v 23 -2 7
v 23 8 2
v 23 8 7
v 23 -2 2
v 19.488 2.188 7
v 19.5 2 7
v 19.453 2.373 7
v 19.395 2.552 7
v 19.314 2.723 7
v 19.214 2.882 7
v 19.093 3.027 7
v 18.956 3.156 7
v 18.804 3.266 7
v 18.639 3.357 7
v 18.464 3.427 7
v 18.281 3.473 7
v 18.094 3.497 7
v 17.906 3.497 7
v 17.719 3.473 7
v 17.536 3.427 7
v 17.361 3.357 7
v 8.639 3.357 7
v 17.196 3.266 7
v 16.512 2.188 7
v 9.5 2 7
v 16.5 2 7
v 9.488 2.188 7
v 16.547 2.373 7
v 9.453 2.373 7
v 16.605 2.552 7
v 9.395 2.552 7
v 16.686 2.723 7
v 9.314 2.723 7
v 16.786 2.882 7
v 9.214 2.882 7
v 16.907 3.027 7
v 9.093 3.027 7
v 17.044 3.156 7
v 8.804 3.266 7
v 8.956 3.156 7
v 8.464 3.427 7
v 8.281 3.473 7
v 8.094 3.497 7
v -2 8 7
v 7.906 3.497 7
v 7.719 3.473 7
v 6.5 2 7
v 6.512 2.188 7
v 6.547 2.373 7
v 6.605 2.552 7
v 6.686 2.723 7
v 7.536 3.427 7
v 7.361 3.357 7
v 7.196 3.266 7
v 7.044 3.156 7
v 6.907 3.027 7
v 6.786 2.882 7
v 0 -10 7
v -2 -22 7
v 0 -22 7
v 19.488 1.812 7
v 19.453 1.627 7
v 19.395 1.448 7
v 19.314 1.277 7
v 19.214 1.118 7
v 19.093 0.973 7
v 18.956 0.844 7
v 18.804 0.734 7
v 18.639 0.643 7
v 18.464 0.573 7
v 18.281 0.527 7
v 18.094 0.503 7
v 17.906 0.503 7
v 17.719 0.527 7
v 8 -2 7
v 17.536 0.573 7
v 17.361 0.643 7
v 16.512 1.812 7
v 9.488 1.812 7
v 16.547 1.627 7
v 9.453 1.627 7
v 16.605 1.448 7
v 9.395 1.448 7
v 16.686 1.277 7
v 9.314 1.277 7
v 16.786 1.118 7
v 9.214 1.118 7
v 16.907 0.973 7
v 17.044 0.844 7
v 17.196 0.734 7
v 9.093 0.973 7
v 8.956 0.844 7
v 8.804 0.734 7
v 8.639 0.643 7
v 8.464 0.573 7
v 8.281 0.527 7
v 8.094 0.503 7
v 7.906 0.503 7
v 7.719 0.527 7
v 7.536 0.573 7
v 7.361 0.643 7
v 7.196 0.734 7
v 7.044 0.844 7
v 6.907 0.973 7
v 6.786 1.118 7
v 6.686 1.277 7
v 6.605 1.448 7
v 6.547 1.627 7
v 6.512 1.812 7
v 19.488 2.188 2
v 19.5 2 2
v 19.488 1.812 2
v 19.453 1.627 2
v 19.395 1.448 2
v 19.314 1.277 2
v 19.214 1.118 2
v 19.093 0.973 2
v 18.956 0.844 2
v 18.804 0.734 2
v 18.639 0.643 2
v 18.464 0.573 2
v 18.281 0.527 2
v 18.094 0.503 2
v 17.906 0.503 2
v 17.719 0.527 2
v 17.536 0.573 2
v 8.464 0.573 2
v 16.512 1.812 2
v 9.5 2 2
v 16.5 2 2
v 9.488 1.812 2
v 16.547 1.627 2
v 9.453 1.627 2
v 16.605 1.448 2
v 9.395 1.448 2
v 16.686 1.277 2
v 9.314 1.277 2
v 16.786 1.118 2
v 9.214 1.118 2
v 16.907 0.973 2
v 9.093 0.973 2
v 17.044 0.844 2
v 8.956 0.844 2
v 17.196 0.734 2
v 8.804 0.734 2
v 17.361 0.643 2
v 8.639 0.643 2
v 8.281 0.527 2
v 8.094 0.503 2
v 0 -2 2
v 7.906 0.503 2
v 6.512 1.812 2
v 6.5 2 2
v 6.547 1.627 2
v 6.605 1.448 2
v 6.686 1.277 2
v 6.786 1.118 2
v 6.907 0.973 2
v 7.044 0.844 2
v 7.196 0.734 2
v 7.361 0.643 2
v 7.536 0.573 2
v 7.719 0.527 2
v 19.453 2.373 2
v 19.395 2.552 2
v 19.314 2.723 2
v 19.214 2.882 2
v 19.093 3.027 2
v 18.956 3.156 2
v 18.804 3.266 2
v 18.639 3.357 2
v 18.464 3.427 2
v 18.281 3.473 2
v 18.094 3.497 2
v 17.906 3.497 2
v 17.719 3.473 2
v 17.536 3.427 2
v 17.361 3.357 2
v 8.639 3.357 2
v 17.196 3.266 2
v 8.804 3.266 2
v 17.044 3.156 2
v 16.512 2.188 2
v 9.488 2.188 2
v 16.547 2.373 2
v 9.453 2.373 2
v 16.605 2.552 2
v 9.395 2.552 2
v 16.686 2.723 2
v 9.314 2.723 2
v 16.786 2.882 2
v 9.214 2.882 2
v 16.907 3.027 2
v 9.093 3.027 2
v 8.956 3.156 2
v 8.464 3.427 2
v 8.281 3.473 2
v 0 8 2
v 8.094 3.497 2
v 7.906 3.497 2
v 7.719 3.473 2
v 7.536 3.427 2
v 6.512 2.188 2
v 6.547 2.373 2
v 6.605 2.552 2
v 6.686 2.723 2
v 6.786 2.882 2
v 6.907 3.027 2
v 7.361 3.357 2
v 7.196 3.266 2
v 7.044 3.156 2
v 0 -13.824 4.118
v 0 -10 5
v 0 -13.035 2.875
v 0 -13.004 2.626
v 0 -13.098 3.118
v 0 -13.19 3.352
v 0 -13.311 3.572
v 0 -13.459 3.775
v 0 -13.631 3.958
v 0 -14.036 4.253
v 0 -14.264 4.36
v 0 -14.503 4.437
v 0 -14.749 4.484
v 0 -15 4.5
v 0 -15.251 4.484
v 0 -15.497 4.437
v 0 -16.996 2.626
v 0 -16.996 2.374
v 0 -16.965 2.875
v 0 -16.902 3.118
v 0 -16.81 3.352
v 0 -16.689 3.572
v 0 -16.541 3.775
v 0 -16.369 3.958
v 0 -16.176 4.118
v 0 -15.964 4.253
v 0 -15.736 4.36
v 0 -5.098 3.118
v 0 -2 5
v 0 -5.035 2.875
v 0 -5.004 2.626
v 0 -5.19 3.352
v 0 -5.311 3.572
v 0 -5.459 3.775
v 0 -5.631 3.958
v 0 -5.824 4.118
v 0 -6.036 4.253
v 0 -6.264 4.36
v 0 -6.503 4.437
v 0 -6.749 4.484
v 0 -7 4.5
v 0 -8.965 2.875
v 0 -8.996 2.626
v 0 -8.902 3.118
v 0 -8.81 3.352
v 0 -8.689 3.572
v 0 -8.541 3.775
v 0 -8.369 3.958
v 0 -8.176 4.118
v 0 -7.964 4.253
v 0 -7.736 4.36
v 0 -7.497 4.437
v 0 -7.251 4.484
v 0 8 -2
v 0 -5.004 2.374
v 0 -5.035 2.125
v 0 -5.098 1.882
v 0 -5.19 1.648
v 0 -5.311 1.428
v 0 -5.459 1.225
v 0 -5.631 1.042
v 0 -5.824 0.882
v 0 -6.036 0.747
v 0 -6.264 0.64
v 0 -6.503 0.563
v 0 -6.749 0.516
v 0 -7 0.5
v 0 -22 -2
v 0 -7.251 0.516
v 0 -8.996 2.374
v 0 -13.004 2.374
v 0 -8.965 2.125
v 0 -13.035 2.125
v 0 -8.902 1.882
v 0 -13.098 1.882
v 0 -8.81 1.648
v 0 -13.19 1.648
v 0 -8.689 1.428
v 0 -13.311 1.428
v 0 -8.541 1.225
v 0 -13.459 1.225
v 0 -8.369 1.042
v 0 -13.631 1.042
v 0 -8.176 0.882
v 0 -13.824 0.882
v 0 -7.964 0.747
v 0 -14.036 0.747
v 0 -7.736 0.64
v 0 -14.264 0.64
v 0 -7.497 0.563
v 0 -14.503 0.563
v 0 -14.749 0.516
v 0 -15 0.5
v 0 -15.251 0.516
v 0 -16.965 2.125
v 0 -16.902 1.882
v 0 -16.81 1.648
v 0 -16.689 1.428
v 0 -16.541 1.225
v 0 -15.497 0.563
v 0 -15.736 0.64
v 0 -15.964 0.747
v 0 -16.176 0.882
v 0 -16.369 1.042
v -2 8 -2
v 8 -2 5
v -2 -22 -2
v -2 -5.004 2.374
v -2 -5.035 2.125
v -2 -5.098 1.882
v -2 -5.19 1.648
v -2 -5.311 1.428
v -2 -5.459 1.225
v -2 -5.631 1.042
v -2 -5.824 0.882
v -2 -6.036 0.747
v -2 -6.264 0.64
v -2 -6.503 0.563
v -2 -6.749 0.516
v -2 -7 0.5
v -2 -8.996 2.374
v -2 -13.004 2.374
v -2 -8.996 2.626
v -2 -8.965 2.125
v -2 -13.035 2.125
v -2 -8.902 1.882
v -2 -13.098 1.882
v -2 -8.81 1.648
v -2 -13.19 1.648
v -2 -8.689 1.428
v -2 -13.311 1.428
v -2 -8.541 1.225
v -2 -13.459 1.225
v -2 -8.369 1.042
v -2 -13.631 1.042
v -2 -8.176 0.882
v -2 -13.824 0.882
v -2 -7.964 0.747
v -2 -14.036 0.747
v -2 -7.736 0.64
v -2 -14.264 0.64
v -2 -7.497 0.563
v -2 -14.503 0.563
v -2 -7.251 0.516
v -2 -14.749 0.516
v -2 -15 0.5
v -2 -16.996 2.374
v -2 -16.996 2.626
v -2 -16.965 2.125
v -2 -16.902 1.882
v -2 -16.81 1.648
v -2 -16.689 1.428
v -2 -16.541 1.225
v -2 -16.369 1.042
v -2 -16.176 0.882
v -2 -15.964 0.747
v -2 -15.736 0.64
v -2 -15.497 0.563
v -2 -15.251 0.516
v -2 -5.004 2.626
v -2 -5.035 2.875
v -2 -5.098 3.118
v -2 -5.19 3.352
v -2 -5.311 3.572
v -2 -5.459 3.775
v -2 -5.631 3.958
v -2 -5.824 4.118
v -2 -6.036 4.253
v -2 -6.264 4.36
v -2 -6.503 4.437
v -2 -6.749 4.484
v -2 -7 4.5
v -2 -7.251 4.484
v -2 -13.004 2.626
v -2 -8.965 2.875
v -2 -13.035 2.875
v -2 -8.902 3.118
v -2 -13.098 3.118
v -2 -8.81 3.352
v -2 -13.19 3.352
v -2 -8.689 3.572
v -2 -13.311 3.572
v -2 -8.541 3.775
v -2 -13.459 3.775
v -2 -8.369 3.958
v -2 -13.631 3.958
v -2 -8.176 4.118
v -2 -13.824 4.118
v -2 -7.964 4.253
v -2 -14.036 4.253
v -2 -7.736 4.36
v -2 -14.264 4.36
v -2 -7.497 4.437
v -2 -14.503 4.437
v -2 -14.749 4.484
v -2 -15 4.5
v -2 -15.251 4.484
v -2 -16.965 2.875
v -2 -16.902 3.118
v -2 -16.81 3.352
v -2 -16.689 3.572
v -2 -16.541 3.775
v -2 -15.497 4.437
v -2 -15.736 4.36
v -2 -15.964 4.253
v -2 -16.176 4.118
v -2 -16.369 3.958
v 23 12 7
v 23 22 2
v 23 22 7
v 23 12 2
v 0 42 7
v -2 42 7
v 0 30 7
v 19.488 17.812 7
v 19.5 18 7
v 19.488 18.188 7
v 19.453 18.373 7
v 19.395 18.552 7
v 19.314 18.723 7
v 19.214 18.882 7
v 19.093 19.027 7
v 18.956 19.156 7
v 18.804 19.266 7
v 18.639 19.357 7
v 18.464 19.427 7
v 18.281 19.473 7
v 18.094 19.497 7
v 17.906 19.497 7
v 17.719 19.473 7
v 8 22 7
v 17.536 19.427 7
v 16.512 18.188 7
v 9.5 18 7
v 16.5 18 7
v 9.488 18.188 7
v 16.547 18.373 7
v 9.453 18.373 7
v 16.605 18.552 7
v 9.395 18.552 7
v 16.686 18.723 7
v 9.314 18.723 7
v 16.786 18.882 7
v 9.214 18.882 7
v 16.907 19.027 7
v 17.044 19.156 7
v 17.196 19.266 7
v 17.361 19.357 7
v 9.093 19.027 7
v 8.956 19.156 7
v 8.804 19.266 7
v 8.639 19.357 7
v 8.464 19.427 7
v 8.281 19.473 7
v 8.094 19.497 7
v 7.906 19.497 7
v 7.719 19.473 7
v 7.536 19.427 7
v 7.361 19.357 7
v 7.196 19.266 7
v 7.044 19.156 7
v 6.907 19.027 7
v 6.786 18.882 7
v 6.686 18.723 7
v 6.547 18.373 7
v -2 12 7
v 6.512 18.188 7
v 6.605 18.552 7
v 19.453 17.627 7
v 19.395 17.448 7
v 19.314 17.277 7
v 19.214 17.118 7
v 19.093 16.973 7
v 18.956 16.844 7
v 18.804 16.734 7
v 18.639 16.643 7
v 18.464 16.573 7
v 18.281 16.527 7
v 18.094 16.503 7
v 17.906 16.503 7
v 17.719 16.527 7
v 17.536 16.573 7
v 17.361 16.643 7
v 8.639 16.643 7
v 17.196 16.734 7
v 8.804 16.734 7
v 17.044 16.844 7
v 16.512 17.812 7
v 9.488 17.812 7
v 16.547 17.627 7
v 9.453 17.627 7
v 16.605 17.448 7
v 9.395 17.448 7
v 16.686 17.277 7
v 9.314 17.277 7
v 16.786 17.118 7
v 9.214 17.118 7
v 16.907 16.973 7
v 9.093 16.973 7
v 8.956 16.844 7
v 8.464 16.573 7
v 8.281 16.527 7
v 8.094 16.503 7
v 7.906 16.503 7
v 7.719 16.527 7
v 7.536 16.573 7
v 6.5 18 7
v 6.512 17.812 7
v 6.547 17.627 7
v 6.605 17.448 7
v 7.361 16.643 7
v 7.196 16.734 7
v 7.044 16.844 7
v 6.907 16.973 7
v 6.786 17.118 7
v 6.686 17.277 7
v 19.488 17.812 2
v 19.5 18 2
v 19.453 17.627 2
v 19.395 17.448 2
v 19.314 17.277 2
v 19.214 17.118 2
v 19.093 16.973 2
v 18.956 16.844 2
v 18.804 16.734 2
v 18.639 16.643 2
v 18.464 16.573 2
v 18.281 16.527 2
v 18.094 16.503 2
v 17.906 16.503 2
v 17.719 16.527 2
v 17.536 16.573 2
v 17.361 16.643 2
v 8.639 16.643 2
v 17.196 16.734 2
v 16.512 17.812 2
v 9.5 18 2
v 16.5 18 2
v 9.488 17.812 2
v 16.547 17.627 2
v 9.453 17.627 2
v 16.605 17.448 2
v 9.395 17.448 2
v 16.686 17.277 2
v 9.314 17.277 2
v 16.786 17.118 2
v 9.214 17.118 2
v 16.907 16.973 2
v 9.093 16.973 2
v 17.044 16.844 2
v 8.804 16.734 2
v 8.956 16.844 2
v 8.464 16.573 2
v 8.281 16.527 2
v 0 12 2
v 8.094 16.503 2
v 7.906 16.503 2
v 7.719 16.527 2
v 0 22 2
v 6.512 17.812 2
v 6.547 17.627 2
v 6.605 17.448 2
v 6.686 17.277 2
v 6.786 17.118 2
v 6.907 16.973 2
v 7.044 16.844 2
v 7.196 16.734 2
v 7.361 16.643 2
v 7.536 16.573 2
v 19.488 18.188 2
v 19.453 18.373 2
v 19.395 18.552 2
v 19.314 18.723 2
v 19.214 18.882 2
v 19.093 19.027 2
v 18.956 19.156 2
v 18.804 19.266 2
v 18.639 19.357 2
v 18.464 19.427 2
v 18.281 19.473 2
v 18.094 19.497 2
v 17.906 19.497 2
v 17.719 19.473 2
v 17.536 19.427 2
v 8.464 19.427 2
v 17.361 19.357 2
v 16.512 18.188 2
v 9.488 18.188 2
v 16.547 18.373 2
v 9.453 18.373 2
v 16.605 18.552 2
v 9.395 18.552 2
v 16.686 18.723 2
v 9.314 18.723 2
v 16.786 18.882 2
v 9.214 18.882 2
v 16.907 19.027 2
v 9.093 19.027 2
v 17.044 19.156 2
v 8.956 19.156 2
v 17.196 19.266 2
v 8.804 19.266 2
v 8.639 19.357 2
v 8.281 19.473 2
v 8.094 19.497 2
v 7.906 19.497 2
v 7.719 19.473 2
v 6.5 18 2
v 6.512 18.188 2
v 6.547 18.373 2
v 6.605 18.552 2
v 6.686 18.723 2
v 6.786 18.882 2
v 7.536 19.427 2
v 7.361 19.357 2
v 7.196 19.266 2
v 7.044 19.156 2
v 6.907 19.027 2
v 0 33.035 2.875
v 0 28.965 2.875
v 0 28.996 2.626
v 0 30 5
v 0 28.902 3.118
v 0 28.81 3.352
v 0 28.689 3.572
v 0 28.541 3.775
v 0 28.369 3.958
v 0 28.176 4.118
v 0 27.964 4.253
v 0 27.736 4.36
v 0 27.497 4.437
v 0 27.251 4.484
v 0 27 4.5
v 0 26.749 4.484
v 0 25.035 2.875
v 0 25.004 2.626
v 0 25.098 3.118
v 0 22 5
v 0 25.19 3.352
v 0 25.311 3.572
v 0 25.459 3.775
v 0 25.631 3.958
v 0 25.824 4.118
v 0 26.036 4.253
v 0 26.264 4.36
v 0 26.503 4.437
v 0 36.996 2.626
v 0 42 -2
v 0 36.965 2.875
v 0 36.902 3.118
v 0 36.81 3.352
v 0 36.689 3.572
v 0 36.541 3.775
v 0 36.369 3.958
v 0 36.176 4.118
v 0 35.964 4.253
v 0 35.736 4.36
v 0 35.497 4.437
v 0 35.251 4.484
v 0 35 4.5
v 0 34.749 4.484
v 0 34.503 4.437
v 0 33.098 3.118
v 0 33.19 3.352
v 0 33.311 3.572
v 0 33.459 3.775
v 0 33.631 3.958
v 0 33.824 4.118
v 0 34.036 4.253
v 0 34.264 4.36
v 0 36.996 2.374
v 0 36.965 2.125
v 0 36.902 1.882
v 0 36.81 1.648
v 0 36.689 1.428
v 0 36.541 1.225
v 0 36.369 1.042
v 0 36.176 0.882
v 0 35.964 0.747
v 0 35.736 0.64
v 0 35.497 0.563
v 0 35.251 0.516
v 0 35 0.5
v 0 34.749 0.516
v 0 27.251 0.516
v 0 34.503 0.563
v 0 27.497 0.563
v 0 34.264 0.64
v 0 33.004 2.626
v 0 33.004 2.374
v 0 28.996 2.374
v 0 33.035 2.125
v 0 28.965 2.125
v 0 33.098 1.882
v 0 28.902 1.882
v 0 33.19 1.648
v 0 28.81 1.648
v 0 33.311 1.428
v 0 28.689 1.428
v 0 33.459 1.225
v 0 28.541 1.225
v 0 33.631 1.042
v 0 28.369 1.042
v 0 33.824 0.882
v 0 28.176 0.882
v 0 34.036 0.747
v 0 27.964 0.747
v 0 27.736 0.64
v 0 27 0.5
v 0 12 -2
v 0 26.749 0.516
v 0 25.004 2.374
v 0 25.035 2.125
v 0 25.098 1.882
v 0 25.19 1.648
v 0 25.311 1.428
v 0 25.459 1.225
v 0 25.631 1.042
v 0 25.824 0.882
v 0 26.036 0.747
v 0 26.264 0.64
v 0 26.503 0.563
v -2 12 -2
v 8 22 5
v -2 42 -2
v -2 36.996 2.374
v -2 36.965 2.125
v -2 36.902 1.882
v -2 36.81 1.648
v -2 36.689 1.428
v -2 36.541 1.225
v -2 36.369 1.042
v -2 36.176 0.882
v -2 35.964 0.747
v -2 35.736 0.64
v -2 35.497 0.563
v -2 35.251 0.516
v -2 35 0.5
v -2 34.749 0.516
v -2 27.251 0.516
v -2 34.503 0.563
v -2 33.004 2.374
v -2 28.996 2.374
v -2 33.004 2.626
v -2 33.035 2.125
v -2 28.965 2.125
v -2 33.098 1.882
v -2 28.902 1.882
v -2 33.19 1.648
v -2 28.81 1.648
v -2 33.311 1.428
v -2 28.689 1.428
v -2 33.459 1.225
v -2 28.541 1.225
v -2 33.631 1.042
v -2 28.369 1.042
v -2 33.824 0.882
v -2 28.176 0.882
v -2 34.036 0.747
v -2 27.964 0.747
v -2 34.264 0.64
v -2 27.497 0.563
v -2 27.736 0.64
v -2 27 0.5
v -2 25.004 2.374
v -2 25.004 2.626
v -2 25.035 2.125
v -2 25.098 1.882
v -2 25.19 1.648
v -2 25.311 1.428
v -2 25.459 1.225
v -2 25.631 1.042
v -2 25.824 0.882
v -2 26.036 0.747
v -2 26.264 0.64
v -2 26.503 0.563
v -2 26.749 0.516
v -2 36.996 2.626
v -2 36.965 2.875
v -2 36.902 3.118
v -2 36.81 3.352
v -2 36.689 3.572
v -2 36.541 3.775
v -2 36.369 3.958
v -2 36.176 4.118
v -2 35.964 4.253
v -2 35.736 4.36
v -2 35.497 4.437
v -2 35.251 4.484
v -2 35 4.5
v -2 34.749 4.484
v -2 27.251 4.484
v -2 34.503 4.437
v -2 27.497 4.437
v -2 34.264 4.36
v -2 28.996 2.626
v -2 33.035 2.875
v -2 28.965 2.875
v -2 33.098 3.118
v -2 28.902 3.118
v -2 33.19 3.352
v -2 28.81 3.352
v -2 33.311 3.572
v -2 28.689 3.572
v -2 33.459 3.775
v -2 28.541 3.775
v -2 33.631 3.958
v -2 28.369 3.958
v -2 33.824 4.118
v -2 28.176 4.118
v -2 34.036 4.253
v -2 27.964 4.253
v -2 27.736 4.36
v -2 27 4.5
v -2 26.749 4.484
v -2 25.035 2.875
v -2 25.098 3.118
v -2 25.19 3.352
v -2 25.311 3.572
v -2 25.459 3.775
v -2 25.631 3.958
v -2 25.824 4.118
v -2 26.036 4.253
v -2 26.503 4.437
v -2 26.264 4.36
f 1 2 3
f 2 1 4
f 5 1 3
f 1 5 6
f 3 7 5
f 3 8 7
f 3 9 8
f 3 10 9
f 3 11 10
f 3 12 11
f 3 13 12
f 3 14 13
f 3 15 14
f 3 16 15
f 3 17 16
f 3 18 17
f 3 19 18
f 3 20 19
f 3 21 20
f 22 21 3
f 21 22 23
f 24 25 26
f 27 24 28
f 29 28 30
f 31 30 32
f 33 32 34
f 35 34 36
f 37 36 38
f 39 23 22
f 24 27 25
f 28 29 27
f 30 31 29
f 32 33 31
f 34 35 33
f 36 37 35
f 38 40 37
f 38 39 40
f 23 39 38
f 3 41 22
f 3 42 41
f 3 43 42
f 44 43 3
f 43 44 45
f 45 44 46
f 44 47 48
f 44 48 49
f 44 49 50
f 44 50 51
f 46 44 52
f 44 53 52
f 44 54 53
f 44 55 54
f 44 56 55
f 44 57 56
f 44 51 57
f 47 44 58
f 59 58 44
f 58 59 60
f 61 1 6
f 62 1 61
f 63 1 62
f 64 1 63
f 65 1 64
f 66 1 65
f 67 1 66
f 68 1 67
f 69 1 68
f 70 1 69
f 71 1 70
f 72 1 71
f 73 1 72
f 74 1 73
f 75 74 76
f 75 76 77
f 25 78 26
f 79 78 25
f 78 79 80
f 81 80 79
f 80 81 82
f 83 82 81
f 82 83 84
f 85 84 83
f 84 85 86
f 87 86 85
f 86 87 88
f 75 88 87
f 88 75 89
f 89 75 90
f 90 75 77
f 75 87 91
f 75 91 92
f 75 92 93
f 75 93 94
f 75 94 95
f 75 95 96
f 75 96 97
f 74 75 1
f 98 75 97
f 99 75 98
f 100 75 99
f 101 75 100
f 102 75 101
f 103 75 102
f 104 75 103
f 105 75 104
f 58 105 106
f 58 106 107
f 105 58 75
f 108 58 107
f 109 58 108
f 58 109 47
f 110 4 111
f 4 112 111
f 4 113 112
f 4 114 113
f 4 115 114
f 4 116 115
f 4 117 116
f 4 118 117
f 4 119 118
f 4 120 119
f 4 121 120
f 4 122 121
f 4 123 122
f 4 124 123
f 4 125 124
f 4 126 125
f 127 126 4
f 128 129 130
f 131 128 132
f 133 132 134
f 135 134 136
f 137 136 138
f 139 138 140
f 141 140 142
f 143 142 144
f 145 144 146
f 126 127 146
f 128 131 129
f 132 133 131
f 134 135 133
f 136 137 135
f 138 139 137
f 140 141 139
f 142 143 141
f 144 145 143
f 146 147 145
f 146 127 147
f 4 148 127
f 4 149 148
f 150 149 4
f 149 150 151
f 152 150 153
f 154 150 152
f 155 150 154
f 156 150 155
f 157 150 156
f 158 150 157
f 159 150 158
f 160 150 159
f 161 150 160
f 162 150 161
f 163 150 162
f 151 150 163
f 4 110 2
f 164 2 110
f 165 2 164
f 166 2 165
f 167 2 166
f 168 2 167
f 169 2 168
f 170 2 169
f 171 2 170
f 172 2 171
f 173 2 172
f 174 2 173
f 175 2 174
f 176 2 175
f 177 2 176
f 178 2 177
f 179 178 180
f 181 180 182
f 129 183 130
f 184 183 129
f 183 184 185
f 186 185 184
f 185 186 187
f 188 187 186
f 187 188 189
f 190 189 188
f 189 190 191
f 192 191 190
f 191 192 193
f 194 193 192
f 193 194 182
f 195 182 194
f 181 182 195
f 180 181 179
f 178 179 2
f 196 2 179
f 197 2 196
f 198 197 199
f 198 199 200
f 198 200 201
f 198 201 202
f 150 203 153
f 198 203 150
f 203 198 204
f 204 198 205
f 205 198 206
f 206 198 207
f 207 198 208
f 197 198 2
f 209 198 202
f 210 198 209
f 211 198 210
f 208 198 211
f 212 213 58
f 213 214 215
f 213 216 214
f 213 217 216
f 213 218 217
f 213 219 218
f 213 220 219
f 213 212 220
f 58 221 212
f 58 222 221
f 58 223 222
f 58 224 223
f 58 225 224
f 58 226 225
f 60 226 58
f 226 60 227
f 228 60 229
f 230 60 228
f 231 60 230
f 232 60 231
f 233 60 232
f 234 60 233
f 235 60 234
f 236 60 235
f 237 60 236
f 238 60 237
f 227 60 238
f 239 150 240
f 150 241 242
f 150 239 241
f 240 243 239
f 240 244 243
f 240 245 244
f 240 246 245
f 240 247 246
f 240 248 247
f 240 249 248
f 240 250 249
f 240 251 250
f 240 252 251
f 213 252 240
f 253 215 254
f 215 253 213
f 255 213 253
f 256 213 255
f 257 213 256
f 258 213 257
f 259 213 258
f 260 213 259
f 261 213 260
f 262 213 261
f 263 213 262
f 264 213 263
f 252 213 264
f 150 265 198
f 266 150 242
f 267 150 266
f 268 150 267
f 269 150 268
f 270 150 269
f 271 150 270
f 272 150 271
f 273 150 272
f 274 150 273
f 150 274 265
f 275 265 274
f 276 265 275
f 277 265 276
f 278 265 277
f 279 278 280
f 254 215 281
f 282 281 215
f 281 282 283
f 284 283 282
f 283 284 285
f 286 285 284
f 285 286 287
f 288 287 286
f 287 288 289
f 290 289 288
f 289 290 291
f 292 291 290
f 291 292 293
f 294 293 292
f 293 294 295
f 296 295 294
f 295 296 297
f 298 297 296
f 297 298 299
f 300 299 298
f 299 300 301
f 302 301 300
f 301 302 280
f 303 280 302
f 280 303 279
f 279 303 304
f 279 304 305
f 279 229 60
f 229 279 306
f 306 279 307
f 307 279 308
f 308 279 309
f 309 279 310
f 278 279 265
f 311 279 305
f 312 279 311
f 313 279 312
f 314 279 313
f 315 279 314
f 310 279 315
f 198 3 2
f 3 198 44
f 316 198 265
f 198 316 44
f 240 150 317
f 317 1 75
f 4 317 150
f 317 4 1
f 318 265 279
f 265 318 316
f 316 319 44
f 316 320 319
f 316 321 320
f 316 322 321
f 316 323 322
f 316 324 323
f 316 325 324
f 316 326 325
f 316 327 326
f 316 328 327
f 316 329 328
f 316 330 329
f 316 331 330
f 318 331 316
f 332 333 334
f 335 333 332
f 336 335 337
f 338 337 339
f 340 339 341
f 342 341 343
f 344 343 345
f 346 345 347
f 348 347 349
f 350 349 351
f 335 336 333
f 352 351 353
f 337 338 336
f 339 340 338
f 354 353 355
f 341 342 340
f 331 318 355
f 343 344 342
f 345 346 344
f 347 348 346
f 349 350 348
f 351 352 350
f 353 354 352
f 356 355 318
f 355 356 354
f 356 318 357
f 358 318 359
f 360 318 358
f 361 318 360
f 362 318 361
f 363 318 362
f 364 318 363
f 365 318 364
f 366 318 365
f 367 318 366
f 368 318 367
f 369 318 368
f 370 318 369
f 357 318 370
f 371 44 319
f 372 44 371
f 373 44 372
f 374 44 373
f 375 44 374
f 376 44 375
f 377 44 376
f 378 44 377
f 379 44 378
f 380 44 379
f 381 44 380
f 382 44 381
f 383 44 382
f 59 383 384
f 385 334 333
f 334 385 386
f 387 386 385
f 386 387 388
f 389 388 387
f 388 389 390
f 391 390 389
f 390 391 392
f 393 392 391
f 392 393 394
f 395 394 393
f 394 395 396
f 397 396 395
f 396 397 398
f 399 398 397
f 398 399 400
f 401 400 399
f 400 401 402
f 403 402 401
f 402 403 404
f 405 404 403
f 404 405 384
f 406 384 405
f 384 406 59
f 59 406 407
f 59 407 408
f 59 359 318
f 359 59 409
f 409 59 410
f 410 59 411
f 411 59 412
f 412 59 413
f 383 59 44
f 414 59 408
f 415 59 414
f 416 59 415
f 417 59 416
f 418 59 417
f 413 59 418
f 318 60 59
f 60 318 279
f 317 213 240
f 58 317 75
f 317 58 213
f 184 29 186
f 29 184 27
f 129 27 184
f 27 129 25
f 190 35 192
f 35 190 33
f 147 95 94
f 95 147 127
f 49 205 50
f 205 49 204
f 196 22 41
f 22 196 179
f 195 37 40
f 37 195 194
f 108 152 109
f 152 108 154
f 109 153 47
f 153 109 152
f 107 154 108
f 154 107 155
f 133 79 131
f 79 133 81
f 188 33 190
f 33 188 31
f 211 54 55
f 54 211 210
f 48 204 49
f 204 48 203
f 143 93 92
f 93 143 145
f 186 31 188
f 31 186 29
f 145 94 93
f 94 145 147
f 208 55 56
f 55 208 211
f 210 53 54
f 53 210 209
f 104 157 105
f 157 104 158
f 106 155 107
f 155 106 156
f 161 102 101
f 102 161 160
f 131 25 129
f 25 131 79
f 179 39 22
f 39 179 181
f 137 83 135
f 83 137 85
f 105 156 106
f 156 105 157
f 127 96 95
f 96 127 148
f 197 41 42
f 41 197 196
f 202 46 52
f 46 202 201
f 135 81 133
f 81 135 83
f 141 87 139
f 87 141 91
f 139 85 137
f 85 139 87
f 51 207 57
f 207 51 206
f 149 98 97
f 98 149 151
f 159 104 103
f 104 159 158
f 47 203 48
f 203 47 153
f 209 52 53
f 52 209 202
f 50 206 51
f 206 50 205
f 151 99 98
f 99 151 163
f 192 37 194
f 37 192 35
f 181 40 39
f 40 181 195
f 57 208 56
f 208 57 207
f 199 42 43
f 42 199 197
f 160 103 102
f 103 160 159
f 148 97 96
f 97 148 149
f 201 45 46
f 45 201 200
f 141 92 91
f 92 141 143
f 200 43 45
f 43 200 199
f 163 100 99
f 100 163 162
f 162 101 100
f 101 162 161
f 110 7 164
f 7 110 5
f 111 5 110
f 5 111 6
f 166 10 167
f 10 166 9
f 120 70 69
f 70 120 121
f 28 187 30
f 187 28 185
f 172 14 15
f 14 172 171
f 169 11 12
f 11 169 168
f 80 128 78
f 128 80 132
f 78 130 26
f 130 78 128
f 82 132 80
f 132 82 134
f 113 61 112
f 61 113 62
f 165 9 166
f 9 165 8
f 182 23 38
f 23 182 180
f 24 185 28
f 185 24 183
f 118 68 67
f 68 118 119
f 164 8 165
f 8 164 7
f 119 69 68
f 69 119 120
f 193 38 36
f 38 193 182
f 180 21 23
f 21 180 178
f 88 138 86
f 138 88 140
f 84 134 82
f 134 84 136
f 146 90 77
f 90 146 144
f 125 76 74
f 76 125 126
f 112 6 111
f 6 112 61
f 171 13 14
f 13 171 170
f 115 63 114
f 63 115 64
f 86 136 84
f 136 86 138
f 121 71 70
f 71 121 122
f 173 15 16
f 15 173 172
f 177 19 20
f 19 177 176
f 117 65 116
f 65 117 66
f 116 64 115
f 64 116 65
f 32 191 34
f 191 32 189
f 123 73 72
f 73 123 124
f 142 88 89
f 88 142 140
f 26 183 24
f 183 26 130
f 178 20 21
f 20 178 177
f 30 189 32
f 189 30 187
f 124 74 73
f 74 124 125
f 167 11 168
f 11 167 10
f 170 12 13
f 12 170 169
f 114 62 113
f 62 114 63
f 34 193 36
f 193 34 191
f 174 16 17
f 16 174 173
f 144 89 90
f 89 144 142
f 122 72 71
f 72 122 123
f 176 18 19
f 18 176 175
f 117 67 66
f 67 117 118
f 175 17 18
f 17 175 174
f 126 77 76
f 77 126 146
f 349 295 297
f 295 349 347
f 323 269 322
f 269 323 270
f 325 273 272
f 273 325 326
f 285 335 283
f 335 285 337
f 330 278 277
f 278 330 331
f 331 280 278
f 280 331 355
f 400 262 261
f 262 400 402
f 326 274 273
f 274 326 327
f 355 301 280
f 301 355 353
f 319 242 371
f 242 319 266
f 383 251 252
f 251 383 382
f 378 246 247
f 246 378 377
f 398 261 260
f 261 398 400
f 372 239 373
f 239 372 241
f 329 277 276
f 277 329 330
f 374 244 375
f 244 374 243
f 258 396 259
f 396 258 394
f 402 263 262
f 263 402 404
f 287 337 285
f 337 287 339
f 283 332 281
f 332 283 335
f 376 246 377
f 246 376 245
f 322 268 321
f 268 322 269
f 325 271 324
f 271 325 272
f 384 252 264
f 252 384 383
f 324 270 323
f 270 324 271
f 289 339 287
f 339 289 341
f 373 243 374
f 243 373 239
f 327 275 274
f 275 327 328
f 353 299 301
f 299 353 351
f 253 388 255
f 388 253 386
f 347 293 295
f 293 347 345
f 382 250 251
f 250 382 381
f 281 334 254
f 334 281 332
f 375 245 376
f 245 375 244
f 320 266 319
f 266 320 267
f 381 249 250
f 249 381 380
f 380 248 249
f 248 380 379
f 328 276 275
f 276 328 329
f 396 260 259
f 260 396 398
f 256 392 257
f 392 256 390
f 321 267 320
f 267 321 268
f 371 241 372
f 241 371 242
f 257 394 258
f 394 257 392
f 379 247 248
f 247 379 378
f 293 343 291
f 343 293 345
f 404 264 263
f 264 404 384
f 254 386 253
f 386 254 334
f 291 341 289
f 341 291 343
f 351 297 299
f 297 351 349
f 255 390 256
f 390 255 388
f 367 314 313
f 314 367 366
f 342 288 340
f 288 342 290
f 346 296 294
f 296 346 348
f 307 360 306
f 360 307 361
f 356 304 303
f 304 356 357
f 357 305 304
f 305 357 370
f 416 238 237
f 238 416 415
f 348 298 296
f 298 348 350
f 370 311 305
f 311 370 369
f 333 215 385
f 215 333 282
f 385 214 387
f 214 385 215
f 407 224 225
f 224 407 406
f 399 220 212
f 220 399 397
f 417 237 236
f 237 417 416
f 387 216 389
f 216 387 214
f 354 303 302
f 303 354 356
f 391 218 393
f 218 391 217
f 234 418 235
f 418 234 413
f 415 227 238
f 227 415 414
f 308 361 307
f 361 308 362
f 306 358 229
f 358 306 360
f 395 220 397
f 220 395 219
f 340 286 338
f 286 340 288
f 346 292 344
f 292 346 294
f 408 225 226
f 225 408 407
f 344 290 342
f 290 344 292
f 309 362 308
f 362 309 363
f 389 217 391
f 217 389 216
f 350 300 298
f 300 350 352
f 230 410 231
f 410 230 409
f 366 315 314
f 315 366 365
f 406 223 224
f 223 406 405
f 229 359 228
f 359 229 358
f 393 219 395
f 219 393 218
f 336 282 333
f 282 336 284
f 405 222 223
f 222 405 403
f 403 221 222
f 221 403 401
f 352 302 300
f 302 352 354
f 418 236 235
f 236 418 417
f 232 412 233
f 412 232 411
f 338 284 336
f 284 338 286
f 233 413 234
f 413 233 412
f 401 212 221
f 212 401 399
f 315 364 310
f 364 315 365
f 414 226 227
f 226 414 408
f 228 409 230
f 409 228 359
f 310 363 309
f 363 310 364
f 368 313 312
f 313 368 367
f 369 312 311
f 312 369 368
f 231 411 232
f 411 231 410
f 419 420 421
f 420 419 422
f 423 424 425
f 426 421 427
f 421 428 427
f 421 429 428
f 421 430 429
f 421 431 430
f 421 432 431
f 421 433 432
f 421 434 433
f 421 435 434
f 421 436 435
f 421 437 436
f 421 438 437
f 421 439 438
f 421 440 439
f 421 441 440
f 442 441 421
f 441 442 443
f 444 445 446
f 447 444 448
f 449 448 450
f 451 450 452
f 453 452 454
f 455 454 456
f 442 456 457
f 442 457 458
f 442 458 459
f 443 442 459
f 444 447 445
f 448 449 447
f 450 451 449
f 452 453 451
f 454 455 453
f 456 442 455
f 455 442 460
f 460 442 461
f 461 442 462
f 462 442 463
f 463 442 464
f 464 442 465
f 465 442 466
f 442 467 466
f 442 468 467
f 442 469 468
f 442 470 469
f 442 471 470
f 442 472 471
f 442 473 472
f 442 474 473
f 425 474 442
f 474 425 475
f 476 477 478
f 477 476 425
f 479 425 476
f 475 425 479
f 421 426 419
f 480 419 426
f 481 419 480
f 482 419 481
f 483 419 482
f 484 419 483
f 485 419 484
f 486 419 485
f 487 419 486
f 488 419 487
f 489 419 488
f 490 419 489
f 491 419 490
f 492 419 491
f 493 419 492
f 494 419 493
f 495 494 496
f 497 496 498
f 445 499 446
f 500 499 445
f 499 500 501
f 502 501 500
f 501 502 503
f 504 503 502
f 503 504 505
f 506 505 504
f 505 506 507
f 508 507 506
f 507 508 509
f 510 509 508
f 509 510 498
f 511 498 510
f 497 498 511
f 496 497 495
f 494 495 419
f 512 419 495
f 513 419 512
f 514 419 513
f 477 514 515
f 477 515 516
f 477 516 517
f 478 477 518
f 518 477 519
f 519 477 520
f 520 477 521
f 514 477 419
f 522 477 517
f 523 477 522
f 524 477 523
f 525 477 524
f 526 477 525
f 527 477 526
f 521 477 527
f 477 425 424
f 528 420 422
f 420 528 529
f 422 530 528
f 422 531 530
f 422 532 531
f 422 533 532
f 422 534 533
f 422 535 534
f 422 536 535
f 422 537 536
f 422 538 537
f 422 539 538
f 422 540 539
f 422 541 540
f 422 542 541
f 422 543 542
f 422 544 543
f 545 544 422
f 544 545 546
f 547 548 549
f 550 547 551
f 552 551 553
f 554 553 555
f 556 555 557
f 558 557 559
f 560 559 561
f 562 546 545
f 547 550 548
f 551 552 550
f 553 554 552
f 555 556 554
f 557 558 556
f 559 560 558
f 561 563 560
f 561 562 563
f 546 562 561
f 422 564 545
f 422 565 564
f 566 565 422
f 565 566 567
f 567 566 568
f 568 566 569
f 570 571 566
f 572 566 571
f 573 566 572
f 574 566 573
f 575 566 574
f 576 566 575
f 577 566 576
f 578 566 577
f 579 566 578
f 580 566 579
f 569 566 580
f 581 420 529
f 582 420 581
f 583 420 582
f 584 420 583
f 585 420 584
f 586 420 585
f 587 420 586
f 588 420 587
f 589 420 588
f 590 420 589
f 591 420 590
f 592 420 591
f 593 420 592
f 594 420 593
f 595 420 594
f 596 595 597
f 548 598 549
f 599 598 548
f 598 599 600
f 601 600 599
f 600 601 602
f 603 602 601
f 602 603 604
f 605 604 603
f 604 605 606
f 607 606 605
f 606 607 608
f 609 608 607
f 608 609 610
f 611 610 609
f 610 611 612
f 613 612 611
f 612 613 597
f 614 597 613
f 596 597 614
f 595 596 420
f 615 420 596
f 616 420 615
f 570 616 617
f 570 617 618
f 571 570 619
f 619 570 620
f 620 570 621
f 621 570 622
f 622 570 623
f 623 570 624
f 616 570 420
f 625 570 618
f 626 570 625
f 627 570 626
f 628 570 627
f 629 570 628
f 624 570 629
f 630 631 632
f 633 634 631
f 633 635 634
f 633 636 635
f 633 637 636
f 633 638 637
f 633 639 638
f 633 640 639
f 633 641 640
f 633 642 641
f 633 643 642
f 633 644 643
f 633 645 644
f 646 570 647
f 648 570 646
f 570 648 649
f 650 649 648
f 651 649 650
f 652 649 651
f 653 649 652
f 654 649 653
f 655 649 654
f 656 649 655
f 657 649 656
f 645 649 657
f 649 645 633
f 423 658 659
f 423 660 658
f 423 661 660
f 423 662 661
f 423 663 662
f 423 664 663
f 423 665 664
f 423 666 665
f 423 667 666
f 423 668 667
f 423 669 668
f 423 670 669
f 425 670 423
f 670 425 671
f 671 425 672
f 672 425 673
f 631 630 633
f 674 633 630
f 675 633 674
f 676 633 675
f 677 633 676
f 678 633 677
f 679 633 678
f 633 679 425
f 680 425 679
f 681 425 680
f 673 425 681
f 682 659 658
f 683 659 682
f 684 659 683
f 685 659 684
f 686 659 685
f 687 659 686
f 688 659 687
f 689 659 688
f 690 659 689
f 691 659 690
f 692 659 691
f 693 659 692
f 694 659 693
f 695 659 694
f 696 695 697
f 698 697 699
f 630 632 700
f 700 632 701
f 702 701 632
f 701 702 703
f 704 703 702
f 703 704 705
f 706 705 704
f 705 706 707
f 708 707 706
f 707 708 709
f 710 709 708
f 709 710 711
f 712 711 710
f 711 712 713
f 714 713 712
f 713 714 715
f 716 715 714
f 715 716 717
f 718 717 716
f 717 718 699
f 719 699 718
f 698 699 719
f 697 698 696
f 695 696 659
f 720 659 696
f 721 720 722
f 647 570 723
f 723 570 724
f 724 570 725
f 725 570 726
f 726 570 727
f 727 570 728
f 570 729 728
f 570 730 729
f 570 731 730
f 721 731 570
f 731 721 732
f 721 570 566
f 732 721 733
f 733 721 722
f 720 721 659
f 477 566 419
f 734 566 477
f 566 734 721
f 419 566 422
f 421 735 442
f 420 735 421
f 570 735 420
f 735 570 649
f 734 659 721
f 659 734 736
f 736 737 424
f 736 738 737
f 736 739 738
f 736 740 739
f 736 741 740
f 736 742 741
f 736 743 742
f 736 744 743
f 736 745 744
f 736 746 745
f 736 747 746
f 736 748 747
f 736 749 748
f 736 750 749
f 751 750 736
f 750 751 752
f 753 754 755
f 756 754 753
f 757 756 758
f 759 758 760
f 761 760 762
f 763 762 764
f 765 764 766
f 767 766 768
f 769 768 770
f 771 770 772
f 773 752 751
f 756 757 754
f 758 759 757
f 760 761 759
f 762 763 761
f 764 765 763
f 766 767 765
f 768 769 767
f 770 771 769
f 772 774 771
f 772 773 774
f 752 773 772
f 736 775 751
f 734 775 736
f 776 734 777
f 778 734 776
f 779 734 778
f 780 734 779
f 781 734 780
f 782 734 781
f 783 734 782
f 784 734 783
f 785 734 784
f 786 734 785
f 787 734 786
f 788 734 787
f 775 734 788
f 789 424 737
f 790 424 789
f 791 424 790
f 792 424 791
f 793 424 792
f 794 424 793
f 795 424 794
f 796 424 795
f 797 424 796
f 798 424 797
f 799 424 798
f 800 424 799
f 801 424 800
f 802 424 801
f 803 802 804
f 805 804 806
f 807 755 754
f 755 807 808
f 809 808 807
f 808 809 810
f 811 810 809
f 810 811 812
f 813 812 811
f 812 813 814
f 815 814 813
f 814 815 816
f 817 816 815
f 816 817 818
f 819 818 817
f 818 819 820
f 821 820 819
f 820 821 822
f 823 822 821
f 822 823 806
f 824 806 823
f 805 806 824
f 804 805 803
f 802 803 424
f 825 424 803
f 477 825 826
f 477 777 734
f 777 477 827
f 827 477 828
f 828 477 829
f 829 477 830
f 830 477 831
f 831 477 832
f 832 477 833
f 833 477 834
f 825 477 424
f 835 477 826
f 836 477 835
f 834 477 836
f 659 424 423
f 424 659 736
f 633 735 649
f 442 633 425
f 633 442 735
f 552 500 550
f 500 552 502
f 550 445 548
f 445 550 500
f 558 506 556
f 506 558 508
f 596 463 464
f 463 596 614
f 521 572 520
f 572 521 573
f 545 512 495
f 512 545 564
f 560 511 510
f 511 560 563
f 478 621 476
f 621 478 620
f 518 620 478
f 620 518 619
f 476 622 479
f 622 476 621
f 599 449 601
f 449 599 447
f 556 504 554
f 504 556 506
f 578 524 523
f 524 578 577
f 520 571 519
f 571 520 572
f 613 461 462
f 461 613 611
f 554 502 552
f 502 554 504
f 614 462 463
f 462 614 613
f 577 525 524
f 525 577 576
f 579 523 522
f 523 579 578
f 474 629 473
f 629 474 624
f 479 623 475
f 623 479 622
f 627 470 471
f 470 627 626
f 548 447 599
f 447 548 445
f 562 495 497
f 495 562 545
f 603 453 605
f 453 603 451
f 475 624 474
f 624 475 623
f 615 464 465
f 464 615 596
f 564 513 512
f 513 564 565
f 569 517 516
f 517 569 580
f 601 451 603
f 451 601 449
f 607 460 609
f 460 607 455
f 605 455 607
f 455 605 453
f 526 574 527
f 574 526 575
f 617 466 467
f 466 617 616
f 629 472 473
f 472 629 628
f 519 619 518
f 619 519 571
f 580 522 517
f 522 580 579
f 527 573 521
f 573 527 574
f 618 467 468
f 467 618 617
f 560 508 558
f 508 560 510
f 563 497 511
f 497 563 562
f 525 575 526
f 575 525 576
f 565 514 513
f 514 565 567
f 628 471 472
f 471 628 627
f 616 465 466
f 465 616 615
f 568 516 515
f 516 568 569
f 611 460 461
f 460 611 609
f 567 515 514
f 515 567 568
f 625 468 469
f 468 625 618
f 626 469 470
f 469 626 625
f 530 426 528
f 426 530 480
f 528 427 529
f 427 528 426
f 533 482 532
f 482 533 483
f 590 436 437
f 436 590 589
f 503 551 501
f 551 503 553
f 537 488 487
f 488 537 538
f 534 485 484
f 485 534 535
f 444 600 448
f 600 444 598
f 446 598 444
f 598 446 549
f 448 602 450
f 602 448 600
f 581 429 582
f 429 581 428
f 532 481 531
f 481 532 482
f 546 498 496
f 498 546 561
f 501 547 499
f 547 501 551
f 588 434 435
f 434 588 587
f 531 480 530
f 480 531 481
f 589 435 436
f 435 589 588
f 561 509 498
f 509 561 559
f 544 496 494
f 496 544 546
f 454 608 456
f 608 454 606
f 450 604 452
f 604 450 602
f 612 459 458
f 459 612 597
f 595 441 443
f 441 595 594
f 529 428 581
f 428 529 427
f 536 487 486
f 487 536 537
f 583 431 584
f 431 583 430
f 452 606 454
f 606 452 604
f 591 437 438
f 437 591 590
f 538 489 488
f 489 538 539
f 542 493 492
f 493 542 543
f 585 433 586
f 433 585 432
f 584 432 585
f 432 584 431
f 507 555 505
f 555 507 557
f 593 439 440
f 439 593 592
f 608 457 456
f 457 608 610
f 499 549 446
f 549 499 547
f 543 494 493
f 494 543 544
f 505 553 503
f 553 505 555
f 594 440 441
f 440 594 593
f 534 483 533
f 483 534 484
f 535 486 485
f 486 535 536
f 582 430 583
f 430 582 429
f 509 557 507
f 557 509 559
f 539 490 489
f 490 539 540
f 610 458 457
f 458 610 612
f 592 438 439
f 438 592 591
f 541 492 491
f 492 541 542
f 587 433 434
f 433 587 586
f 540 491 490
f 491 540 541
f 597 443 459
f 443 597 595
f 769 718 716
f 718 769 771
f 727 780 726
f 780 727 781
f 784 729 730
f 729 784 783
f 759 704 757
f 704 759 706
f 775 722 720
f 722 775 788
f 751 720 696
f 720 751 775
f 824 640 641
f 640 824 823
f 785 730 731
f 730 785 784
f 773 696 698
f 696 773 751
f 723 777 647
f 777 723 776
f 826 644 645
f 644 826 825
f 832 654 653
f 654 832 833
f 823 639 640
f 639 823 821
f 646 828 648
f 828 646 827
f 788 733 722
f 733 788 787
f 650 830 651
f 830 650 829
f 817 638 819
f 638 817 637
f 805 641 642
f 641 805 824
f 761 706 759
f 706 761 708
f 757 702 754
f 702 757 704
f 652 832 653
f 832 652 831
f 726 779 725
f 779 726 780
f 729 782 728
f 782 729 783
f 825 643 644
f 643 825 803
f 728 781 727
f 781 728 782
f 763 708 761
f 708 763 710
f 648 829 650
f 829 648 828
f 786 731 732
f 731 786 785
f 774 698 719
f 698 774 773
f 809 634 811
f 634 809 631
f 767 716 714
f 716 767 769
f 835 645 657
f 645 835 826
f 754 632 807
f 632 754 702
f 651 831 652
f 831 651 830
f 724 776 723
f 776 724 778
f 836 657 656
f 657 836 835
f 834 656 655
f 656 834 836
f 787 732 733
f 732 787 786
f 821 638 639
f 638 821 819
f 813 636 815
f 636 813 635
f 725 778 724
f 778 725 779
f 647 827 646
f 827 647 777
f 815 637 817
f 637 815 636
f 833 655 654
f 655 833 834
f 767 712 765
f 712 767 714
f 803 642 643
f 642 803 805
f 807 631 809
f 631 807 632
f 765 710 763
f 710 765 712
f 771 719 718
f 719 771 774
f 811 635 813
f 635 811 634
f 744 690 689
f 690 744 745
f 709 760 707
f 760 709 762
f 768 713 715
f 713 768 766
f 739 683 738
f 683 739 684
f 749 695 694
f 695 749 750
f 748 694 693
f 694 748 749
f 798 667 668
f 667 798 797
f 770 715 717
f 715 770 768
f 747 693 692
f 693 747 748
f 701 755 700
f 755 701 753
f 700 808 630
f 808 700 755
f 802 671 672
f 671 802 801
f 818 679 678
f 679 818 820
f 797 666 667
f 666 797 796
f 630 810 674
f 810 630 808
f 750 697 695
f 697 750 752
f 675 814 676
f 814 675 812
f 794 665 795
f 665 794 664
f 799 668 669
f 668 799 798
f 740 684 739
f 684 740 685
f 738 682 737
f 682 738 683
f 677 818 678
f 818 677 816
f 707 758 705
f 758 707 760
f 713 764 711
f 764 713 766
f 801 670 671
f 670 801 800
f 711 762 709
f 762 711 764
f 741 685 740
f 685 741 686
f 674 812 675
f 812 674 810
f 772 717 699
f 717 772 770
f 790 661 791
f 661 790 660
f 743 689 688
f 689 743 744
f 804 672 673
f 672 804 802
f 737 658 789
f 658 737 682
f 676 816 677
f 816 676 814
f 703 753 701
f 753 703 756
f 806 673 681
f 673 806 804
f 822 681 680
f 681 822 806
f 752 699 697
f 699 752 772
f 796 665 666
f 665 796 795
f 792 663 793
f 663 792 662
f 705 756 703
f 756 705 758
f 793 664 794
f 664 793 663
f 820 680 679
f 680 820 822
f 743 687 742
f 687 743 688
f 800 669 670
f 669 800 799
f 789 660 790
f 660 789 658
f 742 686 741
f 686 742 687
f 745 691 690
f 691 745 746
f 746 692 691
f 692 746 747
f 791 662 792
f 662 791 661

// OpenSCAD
include <MCAD/materials.scad>
include <MCAD/metric_fastners.scad>

bracket();
translate([0,20,0]) mirror([0,1,0]) bracket();

module bracket() {
    difference(){
union() {
//translate([3,-2,6.5]) cube([20,2,6.5]);
translate([0,-2,2]) cube([23,10,5]);
translate([-2,-22,-2]) cube([2,30,9]);
translate([0,0,5]) linear_extrude(height = 2) polygon(points=[[0,0],[10,0],[0,-10]]);
}
translate([8,2,-5]) cylinder(h=20, r=1.5, r2=1.5 );
translate([18,2,-5]) cylinder(h=20, r=1.5, r2=1.5 );

translate([-5,-7,2.5]) rotate([0,90,0])cylinder(h=10, r=2, r2=2 );
translate([-5,-15,2.5]) rotate([0,90,0])cylinder(h=10, r=2, r2=2 );
}
}
module micro_switch(with_extra_parts=false, exploded=false) {
  scale([-1,1,1]) translate([-19.8, 0, 0]){
    difference() {
      color(BlackPaint) cube([19.8, 10.8, 6.4]);

      translate([5.15, 2, 0]) {
        translate([0, 0, -0.5])
          cylinder(h = 7.4, R=2.6, $fn=100);
        translate([9.5, 0, -0.5])
        cylinder(h = 7.4, R=2.6, $fn=100);
      }
    }
    translate([2.8, 10.8, 1.2])
      rotate([0,0,10])
        color(Steel) cube([17,1,4]);

    if(with_extra_parts)
      micro_switch_extras(exploded_distance=(exploded?15:0));
  }

  module micro_switch_extras(exploded_distance=0) {
    screw_size = 2.2;
    screw_length = 13;
    echo("Non-Plastic Parts, 2, Self Tapping Screw 2.2 x 13 mm for micro switch");
    translate([5.15, 2, 0]) color(Steel) {
      translate([0, 0, 0.5+6.4+exploded_distance])
        rotate([180,0,0]) csk_bolt(screw_size, screw_length);
      translate([9.5, 0, 0.5+6.4+exploded_distance])
        rotate([180,0,0]) csk_bolt(screw_size, screw_length);
    }
  }

}


//micro_switch();
